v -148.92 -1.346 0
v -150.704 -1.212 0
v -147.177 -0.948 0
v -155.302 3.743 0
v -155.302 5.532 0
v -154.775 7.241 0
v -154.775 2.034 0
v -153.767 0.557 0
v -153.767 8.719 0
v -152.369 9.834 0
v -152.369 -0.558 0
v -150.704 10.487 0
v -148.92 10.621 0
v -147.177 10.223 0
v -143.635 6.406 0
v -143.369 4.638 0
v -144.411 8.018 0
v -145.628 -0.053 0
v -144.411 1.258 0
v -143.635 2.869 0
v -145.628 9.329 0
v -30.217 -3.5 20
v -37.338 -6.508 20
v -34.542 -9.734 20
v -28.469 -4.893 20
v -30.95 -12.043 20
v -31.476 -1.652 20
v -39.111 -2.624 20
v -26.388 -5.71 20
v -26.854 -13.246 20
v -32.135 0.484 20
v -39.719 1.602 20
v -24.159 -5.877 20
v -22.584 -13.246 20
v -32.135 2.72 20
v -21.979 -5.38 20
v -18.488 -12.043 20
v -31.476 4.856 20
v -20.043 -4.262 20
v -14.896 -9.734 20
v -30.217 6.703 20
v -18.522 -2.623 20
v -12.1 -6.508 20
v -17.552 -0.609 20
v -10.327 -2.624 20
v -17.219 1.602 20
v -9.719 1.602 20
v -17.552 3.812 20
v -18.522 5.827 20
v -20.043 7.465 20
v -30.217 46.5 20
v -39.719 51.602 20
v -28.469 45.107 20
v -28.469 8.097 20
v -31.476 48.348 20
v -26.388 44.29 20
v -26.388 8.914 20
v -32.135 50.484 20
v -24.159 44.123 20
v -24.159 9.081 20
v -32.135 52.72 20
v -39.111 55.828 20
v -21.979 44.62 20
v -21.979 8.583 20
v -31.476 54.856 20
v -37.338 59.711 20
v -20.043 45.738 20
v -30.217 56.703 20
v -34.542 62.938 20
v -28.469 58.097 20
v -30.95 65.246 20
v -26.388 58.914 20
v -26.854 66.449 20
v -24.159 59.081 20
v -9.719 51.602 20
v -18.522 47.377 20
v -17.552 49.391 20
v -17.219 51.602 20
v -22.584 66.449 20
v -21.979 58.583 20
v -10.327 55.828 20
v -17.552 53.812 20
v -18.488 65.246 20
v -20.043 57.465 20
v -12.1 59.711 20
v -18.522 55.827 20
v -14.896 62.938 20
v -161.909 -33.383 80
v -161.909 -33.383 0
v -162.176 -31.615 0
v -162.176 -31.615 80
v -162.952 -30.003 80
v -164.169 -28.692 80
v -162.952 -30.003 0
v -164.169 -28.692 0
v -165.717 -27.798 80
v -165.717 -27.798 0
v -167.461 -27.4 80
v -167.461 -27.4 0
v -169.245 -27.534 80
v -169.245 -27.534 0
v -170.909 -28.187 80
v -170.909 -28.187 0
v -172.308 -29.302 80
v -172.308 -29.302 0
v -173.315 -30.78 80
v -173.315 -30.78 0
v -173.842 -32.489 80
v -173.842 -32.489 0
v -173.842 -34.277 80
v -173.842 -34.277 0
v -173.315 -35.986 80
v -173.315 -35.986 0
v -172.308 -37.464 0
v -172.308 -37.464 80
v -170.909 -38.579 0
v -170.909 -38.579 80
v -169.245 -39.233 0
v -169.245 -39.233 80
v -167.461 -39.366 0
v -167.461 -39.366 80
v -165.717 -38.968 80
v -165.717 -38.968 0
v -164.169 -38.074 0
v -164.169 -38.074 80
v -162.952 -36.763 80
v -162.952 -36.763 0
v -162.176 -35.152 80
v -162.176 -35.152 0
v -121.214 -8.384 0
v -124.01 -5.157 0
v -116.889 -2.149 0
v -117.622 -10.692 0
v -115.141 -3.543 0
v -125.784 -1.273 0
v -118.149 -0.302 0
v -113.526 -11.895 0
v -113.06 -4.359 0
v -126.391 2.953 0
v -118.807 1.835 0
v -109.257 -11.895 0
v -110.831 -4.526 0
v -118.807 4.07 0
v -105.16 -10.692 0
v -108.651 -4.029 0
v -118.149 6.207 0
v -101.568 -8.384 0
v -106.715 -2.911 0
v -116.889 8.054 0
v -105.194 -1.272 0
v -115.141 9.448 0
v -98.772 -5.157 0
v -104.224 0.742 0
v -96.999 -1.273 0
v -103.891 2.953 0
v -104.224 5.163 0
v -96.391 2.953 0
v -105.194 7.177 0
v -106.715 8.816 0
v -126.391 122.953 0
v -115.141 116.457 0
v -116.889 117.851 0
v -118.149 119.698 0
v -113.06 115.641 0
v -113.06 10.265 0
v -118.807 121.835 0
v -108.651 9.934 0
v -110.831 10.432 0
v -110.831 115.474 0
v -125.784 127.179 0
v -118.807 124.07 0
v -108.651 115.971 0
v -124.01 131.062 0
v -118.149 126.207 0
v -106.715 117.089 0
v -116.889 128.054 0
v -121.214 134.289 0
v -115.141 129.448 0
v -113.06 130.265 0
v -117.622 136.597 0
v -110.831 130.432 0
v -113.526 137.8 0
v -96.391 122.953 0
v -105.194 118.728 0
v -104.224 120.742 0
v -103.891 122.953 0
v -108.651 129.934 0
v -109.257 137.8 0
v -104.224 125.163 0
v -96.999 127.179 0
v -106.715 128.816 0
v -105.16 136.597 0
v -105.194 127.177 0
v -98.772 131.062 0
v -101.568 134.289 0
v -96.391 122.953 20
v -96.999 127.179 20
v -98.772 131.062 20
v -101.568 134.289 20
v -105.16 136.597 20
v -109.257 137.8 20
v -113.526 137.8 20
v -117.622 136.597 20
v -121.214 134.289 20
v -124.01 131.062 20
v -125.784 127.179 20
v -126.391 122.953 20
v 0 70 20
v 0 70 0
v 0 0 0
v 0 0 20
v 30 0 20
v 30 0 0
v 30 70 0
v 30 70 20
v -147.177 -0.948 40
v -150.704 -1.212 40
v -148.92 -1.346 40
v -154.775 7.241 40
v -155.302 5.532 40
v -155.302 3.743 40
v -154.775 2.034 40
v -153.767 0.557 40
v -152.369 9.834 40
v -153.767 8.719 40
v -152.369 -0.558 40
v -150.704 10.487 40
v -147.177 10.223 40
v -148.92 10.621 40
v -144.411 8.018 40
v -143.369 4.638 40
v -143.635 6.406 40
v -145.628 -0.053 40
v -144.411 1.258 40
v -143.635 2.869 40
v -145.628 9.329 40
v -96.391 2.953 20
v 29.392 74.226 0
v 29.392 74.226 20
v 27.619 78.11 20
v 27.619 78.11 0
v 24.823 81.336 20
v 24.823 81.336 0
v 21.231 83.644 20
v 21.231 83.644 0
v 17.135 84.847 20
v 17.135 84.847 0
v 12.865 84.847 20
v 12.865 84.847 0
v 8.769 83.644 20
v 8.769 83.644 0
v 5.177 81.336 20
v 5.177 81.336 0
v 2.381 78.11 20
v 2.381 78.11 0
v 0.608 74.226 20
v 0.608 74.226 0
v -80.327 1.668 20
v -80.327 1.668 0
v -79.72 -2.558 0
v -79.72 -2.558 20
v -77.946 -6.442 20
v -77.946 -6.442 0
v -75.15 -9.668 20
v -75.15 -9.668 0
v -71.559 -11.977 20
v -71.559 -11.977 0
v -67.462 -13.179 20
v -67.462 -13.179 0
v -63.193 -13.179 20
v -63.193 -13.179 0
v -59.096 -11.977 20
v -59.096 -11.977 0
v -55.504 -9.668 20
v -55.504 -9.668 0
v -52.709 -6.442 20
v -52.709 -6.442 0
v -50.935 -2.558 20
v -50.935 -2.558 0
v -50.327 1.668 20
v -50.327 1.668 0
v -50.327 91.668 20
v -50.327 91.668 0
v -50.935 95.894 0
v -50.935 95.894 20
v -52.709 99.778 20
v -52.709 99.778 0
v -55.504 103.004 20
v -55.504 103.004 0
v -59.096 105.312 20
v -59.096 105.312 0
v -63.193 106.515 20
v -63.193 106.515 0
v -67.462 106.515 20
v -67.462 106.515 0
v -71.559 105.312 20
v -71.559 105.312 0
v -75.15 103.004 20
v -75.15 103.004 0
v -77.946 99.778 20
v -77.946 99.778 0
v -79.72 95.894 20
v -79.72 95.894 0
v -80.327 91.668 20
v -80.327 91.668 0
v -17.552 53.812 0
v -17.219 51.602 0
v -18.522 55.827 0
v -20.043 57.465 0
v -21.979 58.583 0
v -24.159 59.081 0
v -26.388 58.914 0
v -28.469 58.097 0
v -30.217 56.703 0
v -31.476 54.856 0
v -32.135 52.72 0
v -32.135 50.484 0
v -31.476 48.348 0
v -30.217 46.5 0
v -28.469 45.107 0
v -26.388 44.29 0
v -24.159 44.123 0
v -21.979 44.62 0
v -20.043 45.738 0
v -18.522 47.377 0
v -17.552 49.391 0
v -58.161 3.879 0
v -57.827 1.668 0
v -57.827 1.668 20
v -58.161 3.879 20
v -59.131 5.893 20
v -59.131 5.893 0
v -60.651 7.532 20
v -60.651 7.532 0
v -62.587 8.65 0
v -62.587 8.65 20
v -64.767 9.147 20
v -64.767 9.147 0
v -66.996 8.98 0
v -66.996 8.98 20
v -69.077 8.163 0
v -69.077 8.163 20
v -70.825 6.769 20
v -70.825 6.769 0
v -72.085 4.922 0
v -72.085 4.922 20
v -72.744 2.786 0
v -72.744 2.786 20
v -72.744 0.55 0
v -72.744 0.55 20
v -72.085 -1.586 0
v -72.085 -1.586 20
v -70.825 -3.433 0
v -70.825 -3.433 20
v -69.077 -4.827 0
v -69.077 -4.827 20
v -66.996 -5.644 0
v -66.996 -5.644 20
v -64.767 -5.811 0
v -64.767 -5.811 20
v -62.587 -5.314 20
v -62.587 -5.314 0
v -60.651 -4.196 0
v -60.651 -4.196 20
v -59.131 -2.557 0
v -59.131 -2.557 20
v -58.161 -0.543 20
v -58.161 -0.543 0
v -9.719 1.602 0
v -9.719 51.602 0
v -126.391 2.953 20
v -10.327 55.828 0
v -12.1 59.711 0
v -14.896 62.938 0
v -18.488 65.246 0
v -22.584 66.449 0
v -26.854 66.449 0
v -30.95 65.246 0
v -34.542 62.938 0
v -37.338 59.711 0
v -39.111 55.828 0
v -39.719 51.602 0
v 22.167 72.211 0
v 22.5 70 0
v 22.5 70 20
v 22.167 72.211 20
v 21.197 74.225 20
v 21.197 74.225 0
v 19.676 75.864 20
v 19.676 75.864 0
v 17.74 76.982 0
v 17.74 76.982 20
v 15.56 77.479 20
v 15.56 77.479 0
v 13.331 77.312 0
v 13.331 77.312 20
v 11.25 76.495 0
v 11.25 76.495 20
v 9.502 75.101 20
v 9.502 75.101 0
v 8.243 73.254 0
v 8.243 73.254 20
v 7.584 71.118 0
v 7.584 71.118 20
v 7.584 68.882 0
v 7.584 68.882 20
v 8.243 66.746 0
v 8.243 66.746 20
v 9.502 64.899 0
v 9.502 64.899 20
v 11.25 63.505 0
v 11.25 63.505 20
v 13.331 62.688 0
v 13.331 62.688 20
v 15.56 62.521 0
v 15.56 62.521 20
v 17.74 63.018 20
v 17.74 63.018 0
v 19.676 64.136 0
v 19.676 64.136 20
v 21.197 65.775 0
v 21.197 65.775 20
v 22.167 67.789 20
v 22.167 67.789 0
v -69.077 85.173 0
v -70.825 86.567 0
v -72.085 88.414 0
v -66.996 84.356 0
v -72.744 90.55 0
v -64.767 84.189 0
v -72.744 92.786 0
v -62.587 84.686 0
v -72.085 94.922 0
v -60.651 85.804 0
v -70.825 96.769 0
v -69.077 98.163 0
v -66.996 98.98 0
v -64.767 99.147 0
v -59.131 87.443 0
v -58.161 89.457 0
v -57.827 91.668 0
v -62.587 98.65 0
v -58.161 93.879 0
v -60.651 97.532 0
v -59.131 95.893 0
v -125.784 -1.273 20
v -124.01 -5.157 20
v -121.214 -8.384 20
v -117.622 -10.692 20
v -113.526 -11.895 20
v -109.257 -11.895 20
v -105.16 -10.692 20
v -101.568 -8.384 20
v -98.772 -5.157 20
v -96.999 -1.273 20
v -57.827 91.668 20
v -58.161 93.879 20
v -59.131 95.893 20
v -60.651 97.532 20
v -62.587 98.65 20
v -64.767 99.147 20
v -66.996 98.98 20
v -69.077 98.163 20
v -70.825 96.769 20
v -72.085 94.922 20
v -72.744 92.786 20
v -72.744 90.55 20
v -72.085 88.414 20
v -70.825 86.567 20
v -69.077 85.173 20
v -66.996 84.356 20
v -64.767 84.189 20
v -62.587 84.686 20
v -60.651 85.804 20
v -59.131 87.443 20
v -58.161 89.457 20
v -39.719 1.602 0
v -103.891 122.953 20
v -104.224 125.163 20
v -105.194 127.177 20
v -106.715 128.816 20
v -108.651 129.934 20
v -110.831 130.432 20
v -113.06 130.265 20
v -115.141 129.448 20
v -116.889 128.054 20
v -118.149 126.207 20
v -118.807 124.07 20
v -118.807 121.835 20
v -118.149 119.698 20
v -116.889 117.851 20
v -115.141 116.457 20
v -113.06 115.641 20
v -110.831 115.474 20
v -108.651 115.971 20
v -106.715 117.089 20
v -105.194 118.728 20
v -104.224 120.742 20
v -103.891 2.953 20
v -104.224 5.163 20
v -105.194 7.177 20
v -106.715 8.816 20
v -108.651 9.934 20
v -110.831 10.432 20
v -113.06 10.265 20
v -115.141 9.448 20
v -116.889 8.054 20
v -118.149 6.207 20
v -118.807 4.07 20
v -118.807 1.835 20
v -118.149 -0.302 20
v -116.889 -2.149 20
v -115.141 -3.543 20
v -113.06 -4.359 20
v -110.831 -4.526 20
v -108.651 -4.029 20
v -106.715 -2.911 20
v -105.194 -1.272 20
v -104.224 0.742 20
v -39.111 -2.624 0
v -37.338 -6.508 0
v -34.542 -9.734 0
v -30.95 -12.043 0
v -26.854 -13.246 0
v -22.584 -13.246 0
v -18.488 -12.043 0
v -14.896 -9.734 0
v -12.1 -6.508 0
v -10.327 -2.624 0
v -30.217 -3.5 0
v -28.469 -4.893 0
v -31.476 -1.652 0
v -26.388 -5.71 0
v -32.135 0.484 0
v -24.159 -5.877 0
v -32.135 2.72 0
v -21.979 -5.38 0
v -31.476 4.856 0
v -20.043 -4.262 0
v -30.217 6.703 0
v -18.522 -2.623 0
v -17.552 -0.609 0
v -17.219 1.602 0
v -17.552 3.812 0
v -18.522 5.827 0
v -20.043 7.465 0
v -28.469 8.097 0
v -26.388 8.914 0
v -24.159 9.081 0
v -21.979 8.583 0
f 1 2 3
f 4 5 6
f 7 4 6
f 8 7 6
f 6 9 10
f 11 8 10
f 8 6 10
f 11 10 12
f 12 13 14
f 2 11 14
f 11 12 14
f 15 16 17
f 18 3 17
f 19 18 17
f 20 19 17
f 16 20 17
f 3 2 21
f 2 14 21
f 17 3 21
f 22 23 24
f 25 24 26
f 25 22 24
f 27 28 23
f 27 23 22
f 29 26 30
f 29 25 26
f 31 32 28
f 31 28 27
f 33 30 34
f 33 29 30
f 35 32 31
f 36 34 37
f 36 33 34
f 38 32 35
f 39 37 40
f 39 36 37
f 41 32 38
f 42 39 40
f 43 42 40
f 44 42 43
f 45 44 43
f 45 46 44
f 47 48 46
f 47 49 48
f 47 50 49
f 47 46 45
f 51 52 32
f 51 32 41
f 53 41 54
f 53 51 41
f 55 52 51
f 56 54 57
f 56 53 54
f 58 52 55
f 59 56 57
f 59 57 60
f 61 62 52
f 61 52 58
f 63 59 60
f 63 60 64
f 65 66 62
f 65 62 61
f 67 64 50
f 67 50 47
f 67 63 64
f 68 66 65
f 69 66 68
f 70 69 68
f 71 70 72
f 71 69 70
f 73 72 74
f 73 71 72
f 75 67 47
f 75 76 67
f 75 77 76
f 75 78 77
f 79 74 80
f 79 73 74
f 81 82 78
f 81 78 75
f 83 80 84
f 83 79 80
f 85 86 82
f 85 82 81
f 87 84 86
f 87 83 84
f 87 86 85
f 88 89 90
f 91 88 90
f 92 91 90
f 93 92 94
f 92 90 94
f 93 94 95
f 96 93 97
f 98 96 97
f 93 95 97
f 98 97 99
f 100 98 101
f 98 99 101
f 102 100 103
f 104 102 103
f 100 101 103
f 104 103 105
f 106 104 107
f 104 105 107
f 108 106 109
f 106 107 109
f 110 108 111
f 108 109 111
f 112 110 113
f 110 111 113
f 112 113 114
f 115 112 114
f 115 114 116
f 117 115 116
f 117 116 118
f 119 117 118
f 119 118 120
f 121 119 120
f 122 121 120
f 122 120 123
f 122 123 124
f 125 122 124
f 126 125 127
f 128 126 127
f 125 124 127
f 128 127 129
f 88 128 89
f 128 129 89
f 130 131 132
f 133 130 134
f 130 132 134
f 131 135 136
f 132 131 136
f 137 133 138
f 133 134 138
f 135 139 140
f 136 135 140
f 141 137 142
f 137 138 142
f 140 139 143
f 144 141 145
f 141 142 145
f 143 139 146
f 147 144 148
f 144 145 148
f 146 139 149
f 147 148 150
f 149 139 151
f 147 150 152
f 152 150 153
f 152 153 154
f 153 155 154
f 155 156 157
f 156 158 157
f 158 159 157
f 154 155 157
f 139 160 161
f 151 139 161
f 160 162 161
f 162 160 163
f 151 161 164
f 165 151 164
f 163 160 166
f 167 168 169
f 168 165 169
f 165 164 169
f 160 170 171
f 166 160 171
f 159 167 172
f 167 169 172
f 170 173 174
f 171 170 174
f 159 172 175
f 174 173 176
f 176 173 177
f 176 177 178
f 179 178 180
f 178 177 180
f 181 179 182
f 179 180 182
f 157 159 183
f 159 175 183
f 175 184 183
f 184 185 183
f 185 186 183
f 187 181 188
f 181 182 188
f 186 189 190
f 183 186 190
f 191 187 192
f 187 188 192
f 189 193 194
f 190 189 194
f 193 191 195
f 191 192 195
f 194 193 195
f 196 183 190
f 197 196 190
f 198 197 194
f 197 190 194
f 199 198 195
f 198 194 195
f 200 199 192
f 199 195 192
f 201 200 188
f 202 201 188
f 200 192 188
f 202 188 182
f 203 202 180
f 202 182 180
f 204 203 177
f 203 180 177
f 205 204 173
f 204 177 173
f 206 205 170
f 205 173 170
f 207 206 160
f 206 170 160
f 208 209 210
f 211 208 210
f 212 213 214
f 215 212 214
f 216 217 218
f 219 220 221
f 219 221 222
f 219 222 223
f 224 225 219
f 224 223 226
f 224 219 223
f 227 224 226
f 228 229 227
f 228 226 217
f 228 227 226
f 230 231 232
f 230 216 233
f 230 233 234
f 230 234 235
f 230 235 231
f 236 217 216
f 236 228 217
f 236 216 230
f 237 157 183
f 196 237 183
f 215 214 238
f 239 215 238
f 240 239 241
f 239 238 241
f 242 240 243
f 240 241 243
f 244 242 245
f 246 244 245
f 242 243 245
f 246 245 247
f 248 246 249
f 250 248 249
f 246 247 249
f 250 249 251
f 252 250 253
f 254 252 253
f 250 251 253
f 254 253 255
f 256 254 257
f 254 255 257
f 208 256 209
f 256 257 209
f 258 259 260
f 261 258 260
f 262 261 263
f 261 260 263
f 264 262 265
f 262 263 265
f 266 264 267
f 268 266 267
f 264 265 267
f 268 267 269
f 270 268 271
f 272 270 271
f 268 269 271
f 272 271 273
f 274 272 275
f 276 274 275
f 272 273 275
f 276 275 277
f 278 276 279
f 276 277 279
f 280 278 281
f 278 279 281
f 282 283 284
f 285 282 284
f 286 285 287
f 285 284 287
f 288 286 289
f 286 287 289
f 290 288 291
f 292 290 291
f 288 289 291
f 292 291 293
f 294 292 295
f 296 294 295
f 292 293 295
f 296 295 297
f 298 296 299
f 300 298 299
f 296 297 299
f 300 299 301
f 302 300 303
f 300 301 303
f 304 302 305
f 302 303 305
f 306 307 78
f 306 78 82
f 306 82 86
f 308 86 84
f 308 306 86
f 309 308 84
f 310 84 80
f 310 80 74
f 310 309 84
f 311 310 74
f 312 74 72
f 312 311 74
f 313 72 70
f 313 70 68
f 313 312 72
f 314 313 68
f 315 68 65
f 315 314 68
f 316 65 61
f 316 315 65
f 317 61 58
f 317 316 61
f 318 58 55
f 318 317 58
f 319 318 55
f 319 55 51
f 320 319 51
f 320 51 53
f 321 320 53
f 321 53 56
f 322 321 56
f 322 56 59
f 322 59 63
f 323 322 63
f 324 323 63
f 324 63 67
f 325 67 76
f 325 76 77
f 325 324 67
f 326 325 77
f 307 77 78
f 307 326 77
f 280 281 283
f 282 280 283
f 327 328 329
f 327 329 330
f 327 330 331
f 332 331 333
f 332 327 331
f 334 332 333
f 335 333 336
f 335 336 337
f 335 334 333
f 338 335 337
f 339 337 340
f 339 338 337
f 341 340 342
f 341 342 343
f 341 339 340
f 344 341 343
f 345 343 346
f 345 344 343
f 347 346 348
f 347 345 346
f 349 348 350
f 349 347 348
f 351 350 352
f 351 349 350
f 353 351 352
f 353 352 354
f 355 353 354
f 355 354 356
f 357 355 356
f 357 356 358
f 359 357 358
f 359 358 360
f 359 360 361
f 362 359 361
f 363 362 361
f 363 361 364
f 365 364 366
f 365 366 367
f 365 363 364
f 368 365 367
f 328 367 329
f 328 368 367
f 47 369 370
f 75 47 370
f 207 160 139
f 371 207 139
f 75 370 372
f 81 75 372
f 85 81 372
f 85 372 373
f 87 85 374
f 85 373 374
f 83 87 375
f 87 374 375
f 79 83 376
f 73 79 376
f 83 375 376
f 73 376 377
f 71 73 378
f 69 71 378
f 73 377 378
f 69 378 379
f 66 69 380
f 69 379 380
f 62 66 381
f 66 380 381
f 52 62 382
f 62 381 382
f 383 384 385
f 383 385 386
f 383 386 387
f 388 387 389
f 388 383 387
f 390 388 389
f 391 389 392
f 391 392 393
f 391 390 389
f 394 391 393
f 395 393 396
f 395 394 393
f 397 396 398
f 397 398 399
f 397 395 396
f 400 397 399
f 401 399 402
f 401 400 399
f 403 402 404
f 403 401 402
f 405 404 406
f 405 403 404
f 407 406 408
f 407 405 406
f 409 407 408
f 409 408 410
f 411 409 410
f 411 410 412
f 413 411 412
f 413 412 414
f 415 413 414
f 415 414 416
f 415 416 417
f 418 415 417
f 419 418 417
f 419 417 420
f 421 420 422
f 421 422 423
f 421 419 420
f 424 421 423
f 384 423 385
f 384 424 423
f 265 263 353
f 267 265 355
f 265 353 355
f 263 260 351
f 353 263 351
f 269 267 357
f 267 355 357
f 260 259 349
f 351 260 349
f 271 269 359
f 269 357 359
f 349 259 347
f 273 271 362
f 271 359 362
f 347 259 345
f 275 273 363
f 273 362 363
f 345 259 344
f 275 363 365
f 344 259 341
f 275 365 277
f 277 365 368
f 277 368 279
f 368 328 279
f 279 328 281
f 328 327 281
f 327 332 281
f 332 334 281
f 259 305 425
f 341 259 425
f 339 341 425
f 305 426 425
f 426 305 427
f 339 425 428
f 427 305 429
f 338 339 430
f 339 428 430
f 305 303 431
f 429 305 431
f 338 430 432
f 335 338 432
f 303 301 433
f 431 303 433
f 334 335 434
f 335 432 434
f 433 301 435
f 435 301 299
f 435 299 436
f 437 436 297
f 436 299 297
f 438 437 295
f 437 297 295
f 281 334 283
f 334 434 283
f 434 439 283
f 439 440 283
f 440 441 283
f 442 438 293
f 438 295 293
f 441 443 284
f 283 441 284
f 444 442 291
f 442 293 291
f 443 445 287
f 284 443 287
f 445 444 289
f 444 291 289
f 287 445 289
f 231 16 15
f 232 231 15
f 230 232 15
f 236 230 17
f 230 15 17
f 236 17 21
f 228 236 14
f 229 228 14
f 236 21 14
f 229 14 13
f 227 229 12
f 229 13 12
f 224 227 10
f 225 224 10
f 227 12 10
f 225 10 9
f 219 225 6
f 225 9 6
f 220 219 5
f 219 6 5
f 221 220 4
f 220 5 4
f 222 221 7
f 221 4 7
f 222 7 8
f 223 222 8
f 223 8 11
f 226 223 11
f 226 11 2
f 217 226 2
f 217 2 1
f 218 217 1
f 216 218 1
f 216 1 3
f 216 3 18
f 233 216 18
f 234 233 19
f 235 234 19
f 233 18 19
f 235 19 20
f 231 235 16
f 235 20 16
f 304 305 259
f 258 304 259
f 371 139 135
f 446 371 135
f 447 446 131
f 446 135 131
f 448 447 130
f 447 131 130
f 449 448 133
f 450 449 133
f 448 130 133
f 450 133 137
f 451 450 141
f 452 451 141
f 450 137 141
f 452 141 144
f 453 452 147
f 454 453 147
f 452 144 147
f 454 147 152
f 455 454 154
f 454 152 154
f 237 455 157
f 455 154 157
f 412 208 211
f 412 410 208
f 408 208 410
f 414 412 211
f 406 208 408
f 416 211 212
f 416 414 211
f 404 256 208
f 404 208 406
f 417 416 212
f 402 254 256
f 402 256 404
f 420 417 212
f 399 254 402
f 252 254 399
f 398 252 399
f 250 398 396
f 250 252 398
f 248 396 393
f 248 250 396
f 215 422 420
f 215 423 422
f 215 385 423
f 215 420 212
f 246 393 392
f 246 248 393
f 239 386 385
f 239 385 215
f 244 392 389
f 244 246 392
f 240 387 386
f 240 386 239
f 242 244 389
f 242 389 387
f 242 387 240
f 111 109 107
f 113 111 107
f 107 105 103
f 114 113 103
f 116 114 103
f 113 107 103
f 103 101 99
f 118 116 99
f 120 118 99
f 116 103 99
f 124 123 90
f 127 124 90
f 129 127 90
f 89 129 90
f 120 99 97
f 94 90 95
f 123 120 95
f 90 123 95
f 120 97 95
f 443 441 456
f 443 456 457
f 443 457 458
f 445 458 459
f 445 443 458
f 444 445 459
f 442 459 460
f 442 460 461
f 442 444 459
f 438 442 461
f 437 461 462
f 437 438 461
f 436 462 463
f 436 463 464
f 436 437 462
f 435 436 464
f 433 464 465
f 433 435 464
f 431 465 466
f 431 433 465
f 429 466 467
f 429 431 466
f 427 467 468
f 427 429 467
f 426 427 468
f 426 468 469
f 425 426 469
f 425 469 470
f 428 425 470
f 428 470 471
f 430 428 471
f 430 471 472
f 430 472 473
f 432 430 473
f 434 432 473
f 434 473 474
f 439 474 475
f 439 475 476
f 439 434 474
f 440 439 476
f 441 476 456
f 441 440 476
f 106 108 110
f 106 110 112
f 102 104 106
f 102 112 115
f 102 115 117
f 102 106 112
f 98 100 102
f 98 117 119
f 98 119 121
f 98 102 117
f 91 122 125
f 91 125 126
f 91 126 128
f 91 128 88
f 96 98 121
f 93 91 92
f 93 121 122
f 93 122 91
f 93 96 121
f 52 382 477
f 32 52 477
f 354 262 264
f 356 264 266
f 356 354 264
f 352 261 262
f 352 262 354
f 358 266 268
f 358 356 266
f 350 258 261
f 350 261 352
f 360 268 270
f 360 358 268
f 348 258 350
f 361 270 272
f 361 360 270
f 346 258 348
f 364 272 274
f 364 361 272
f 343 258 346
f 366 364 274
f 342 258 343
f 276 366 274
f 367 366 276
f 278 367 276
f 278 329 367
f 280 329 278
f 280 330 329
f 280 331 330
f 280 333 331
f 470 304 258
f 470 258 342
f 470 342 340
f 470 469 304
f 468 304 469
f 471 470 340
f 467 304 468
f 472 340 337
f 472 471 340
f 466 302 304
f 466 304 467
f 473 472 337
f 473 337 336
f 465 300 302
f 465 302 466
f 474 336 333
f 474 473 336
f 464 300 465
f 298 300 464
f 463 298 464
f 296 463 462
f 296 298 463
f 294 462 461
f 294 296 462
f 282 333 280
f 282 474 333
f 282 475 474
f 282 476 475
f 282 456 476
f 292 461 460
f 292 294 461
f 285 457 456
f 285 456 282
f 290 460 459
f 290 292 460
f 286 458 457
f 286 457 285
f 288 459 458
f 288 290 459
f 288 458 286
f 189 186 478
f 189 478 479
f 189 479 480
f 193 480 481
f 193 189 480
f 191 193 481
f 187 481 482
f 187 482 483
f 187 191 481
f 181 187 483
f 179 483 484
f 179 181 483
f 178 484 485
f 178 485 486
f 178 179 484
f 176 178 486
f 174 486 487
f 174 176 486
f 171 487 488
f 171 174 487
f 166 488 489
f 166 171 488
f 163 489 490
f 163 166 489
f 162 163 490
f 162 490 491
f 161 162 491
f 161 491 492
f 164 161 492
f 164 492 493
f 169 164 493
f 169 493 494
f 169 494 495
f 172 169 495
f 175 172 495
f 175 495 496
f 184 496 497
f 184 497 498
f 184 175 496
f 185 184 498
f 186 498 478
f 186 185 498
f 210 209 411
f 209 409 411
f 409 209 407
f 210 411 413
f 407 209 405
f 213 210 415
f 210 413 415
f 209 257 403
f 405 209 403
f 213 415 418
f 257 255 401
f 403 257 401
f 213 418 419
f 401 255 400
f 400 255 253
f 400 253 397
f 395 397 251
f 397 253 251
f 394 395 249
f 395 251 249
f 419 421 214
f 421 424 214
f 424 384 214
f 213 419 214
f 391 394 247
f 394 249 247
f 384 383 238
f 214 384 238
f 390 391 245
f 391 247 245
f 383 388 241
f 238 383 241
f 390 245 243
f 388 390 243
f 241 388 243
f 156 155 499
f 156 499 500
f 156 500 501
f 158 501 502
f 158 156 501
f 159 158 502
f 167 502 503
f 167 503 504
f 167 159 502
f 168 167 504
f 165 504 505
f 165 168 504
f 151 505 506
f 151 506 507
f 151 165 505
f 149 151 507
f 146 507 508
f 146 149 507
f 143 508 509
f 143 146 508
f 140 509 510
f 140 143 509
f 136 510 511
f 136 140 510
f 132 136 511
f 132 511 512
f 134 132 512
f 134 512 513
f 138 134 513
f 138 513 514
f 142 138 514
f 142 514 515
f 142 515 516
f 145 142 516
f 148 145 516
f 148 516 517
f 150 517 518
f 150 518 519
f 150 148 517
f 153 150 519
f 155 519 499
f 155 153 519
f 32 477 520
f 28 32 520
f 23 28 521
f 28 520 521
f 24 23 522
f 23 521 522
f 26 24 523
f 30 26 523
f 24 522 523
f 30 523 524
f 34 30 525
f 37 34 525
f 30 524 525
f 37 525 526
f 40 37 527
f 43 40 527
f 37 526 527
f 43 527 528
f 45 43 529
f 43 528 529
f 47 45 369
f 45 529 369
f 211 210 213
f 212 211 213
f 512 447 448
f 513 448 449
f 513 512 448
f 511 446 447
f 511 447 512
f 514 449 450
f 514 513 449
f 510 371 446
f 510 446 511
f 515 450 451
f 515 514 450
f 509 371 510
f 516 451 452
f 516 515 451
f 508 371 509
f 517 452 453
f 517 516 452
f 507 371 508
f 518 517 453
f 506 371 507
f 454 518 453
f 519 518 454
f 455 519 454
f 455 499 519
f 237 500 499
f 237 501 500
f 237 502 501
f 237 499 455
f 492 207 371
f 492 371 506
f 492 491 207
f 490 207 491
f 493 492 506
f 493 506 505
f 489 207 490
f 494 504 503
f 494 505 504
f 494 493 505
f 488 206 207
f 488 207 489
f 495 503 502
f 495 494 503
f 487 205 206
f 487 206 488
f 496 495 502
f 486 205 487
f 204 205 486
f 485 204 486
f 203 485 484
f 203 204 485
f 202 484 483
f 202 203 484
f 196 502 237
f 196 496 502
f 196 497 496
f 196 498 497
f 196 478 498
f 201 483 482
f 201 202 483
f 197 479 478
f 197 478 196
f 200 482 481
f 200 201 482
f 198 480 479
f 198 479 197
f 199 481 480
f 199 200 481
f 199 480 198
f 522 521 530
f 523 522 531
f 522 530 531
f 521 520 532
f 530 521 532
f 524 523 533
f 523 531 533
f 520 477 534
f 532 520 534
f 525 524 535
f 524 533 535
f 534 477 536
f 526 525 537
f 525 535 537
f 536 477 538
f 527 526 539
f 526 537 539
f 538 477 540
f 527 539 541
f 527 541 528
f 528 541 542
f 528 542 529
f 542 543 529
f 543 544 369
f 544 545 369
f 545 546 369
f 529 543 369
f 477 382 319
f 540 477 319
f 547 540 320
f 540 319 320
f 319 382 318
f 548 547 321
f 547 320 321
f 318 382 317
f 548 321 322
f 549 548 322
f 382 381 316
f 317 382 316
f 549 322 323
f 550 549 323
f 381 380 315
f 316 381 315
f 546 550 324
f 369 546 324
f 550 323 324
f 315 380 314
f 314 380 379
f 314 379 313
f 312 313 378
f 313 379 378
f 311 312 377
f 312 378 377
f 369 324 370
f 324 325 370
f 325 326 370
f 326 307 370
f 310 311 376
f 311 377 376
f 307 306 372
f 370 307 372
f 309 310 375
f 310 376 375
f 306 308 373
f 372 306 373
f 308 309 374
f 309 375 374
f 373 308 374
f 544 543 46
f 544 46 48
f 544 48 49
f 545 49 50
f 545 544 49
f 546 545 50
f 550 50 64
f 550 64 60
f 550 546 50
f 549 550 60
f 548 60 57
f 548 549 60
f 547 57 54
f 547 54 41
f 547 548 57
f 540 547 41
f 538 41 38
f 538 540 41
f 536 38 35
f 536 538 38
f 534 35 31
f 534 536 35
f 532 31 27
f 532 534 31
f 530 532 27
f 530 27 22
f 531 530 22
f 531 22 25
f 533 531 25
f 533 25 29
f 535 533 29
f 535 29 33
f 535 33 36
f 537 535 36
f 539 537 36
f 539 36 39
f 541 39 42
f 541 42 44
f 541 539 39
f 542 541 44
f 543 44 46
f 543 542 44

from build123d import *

# Parameters (mm, degrees)
F1_R      = 7.5
F2_DEPTH  = 20
F3_R      = 7.5
F4_DEPTH  = 20
F5_R      = 7.5
F6_DEPTH  = 20
F7_R      = 7.5
F8_DEPTH  = 20
F9_R      = 6
F10_DEPTH = 40
F11_R     = 6
F12_DEPTH = 80


with BuildPart() as f2:
    # F1 (on Top) → F2 (new body)
    with BuildSketch(Plane.XY):
        with BuildLine():
            Line((0, 70), (0, 0))
            Line((0, 0), (30, 0))
            Line((30, 0), (30, 70))
            ThreePointArc((30, 70), (15, 85), (0, 70))
        make_face()
        with Locations((15, 70)):
            Circle(F1_R, mode=Mode.SUBTRACT)
    extrude(amount=F2_DEPTH)


with BuildPart() as f4:
    # F3 (on Top) → F4 (new body)
    with BuildSketch(Plane.XY):
        with BuildLine():
            Line((-39.7190231457, 51.6017495219), (-39.7190231457, 1.6017495219))
            ThreePointArc((-39.7190231457, 1.6017495219), (-24.7190231457, -13.3982504781), (-9.7190231457, 1.6017495219))
            Line((-9.7190231457, 1.6017495219), (-9.7190231457, 51.6017495219))
            ThreePointArc((-9.7190231457, 51.6017495219), (-24.7190231457, 66.6017495219), (-39.7190231457, 51.6017495219))
        make_face()
        with Locations((-24.7190231457, 1.6017495219)):
            Circle(F3_R, mode=Mode.SUBTRACT)
        with Locations((-24.7190231457, 51.6017495219)):
            Circle(F3_R, mode=Mode.SUBTRACT)
    extrude(amount=F4_DEPTH)


with BuildPart() as f6:
    # F5 (on Top) → F6 (new body)
    with BuildSketch(Plane.XY):
        with BuildLine():
            Line((-80.3273612261, 91.6679674387), (-80.3273612261, 1.6679674387))
            ThreePointArc((-80.3273612261, 1.6679674387), (-65.3273612261, -13.3320325613), (-50.3273612261, 1.6679674387))
            Line((-50.3273612261, 1.6679674387), (-50.3273612261, 91.6679674387))
            ThreePointArc((-50.3273612261, 91.6679674387), (-65.3273612261, 106.6679674387), (-80.3273612261, 91.6679674387))
        make_face()
        with Locations((-65.3273612261, 1.6679674387)):
            Circle(F5_R, mode=Mode.SUBTRACT)
        with Locations((-65.3273612261, 91.6679674387)):
            Circle(F5_R, mode=Mode.SUBTRACT)
    extrude(amount=F6_DEPTH)


with BuildPart() as f8:
    # F7 (on Top) → F8 (new body)
    with BuildSketch(Plane.XY):
        with BuildLine():
            Line((-126.3912388682, 122.9525510035), (-126.3912388682, 2.9525510035))
            ThreePointArc((-126.3912388682, 2.9525510035), (-111.3912388682, -12.0474489965), (-96.3912388682, 2.9525510035))
            Line((-96.3912388682, 2.9525510035), (-96.3912388682, 122.9525510035))
            ThreePointArc((-96.3912388682, 122.9525510035), (-111.3912388682, 137.9525510035), (-126.3912388682, 122.9525510035))
        make_face()
        with Locations((-111.3912388682, 2.9525510035)):
            Circle(F7_R, mode=Mode.SUBTRACT)
        with Locations((-111.3912388682, 122.9525510035)):
            Circle(F7_R, mode=Mode.SUBTRACT)
    extrude(amount=F8_DEPTH)


with BuildPart() as f10:
    # F9 (on Top) → F10 (new body)
    with BuildSketch(Plane.XY):
        with Locations((-149.3688076735, 4.637687467)):
            Circle(F9_R)
    extrude(amount=F10_DEPTH)


with BuildPart() as f12:
    # F11 (on Top) → F12 (new body)
    with BuildSketch(Plane.XY):
        with Locations((-167.9094731808, -33.383179456)):
            Circle(F11_R)
    extrude(amount=F12_DEPTH)


solid = Compound([f2.part, f4.part, f6.part, f8.part, f10.part, f12.part])
